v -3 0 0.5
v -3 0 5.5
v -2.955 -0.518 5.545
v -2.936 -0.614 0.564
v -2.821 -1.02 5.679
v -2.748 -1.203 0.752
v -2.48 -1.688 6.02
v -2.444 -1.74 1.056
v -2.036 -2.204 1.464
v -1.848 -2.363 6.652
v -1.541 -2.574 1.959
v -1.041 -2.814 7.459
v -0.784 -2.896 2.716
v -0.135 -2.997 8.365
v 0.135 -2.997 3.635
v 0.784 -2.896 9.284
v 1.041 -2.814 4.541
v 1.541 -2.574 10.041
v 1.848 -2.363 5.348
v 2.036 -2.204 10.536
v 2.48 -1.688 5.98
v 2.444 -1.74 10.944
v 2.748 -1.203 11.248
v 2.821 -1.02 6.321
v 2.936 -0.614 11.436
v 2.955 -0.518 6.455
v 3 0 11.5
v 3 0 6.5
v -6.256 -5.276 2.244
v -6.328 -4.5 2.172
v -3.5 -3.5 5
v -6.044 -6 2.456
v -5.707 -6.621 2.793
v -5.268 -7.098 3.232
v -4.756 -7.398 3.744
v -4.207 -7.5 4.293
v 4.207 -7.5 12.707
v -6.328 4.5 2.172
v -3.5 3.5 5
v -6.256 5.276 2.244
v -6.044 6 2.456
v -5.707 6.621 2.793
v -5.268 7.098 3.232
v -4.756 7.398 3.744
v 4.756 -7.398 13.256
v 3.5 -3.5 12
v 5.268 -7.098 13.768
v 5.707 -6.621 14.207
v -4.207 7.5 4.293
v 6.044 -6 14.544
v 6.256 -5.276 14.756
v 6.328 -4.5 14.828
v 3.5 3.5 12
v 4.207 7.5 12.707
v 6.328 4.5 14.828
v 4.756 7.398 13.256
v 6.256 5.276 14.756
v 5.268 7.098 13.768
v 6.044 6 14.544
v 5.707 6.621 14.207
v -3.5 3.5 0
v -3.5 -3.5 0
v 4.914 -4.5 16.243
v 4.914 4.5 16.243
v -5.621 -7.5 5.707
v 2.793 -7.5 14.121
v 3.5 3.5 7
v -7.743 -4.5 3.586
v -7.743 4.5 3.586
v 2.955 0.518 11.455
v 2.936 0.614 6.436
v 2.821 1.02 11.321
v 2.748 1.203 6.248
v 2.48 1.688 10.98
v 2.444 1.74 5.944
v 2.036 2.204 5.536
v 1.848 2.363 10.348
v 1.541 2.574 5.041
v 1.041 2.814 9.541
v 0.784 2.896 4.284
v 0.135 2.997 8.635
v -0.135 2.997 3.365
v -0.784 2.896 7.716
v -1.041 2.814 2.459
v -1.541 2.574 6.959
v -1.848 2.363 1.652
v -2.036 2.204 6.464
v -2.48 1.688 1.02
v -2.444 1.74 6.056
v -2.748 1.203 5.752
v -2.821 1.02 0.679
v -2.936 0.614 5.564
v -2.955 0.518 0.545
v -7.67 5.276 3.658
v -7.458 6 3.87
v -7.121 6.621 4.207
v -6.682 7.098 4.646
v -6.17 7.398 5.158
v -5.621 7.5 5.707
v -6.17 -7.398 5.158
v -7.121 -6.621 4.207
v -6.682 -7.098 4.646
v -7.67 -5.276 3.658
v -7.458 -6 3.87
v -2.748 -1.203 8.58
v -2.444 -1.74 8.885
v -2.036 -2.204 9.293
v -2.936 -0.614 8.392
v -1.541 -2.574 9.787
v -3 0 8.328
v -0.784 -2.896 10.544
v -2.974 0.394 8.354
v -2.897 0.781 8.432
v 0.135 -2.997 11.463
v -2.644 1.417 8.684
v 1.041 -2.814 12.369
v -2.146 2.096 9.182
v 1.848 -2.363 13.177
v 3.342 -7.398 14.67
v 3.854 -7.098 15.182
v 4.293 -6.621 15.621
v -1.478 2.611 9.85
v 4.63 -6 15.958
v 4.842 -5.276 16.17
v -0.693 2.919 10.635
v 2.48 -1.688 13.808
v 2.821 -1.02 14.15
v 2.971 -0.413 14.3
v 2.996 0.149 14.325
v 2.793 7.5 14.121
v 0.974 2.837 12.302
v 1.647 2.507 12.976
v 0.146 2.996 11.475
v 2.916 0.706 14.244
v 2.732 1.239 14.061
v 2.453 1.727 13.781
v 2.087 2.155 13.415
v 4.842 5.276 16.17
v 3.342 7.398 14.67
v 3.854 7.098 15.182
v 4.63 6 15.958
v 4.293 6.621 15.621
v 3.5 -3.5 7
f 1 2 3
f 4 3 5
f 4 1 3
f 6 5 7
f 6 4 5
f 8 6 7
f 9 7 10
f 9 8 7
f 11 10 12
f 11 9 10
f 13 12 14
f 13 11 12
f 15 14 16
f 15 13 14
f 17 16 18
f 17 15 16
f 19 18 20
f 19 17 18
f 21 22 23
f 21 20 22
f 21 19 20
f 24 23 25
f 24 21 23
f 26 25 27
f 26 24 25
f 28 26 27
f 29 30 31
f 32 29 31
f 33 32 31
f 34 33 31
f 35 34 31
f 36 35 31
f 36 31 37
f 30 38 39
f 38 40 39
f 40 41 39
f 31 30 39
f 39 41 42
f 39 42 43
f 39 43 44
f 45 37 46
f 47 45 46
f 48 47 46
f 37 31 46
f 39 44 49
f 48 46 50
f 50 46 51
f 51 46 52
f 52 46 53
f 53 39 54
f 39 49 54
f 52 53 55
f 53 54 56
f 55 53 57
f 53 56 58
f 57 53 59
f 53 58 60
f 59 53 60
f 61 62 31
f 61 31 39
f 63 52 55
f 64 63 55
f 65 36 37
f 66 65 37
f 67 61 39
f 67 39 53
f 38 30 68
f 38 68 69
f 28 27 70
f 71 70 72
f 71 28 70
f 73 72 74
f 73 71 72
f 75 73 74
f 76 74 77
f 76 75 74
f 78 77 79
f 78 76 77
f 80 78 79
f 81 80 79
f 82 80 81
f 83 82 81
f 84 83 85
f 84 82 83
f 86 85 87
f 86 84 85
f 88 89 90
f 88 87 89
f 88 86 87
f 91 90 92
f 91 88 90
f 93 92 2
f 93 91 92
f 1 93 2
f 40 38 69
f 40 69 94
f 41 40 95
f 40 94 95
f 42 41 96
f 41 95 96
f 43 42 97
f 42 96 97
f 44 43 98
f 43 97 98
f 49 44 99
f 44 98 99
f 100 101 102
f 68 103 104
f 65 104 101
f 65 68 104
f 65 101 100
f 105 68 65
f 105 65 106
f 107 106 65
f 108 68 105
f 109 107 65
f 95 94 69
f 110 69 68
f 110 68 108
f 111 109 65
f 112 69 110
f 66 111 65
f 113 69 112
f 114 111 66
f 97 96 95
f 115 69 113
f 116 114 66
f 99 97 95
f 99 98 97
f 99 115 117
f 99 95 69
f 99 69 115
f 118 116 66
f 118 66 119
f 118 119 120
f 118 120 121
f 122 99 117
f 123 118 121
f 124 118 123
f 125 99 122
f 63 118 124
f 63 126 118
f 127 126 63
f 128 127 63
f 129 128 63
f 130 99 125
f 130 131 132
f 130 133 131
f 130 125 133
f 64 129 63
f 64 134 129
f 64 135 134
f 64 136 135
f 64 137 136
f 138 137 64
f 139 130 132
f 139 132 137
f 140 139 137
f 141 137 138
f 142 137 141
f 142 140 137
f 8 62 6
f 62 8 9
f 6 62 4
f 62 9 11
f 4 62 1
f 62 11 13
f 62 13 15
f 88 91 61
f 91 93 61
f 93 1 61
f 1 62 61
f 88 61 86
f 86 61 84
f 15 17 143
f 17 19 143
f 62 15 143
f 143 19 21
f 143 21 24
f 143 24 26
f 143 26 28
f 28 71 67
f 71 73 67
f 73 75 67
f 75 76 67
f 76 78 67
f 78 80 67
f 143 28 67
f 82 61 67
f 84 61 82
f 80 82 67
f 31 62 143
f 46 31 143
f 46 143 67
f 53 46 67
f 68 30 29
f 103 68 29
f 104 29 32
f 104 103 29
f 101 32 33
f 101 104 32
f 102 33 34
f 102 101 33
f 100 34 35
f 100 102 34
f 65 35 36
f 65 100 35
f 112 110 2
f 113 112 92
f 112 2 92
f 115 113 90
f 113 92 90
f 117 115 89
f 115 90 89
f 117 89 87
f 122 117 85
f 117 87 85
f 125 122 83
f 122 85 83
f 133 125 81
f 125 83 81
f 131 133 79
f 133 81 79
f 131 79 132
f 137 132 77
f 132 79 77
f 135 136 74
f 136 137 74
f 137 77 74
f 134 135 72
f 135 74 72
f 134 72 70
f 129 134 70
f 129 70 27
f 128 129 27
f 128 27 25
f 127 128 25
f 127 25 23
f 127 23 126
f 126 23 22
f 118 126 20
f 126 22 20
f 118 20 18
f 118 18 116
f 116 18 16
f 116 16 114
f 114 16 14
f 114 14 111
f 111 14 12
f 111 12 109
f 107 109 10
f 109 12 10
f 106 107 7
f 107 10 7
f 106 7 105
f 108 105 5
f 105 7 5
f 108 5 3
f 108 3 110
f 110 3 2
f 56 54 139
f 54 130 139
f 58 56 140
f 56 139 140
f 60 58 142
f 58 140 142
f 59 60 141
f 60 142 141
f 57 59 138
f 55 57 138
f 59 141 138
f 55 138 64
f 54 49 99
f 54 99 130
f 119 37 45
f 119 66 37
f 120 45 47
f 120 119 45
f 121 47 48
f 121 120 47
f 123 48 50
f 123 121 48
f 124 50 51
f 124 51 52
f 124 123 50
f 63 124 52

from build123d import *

# Parameters (mm, degrees)
SKETCH1_W           = 7
SKETCH1_H           = 7
SKETCH1_R           = 3
BOSS_EXTRUDE1_DEPTH = 12
CUT_EXTRUDE1_DEPTH  = 8
SKETCH5_W           = 17.899494936
SKETCH5_H           = 15
BOSS_EXTRUDE3_DEPTH = 2
SKETCH7_R           = 3
CUT_EXTRUDE3_DEPTH  = 17.242640687
CUT_EXTRUDE2_DEPTH  = 12
FILLET3_R           = 3


with BuildPart() as part:
    # Sketch1 → Boss-Extrude1 (new body)
    with BuildSketch(Plane.XY):
        Rectangle(SKETCH1_W, SKETCH1_H)
        Circle(SKETCH1_R, mode=Mode.SUBTRACT)
    extrude(amount=BOSS_EXTRUDE1_DEPTH)

    # Sketch3 → Cut-Extrude1 (cut, through all)
    with BuildSketch(Plane(origin=(0, 3.5, 0), x_dir=(1, 0, 0), z_dir=(0, 1, 0))):
        Polygon((-3.5, -12), (3.5, -12), (-3.5, -5), align=None)
    extrude(amount=-CUT_EXTRUDE1_DEPTH, mode=Mode.SUBTRACT)

    # Sketch5 → Boss-Extrude3 (add)
    with BuildSketch(Plane(origin=(-4.25, 0, 4.25), x_dir=(0.707106781, 0, 0.707106781), z_dir=(-0.707106781, 0, 0.707106781))):
        with Locations((6.01040764, 0)):
            Rectangle(SKETCH5_W, SKETCH5_H)
    extrude(amount=BOSS_EXTRUDE3_DEPTH)

    # Sketch7 → Cut-Extrude3 (cut, through all)
    with BuildSketch(Plane(origin=(0, 0, 0), x_dir=(-1, 0, 0), z_dir=(0, 0, -1))):
        Circle(SKETCH7_R)
    extrude(amount=-CUT_EXTRUDE3_DEPTH, mode=Mode.SUBTRACT)

    # Sketch6 → Cut-Extrude2 (cut, through all)
    with BuildSketch(Plane(origin=(0, 3.5, 0), x_dir=(1, 0, 0), z_dir=(0, 1, 0))):
        Polygon((-3.5, 0), (3.5, -7), (3.5, 0), align=None)
    extrude(amount=-CUT_EXTRUDE2_DEPTH, mode=Mode.SUBTRACT)

    # Fillet3
    fillet3_edges = [part.edges().sort_by_distance(p)[0] for p in [
        (5.621320344, -7.5, 15.535533906),
        (5.621320344, 7.5, 15.535533906),
        (-7.035533906, 7.5, 2.878679656),
        (-7.035533906, -7.5, 2.878679656),
    ]]
    fillet(fillet3_edges, radius=FILLET3_R)


solid = part.part
